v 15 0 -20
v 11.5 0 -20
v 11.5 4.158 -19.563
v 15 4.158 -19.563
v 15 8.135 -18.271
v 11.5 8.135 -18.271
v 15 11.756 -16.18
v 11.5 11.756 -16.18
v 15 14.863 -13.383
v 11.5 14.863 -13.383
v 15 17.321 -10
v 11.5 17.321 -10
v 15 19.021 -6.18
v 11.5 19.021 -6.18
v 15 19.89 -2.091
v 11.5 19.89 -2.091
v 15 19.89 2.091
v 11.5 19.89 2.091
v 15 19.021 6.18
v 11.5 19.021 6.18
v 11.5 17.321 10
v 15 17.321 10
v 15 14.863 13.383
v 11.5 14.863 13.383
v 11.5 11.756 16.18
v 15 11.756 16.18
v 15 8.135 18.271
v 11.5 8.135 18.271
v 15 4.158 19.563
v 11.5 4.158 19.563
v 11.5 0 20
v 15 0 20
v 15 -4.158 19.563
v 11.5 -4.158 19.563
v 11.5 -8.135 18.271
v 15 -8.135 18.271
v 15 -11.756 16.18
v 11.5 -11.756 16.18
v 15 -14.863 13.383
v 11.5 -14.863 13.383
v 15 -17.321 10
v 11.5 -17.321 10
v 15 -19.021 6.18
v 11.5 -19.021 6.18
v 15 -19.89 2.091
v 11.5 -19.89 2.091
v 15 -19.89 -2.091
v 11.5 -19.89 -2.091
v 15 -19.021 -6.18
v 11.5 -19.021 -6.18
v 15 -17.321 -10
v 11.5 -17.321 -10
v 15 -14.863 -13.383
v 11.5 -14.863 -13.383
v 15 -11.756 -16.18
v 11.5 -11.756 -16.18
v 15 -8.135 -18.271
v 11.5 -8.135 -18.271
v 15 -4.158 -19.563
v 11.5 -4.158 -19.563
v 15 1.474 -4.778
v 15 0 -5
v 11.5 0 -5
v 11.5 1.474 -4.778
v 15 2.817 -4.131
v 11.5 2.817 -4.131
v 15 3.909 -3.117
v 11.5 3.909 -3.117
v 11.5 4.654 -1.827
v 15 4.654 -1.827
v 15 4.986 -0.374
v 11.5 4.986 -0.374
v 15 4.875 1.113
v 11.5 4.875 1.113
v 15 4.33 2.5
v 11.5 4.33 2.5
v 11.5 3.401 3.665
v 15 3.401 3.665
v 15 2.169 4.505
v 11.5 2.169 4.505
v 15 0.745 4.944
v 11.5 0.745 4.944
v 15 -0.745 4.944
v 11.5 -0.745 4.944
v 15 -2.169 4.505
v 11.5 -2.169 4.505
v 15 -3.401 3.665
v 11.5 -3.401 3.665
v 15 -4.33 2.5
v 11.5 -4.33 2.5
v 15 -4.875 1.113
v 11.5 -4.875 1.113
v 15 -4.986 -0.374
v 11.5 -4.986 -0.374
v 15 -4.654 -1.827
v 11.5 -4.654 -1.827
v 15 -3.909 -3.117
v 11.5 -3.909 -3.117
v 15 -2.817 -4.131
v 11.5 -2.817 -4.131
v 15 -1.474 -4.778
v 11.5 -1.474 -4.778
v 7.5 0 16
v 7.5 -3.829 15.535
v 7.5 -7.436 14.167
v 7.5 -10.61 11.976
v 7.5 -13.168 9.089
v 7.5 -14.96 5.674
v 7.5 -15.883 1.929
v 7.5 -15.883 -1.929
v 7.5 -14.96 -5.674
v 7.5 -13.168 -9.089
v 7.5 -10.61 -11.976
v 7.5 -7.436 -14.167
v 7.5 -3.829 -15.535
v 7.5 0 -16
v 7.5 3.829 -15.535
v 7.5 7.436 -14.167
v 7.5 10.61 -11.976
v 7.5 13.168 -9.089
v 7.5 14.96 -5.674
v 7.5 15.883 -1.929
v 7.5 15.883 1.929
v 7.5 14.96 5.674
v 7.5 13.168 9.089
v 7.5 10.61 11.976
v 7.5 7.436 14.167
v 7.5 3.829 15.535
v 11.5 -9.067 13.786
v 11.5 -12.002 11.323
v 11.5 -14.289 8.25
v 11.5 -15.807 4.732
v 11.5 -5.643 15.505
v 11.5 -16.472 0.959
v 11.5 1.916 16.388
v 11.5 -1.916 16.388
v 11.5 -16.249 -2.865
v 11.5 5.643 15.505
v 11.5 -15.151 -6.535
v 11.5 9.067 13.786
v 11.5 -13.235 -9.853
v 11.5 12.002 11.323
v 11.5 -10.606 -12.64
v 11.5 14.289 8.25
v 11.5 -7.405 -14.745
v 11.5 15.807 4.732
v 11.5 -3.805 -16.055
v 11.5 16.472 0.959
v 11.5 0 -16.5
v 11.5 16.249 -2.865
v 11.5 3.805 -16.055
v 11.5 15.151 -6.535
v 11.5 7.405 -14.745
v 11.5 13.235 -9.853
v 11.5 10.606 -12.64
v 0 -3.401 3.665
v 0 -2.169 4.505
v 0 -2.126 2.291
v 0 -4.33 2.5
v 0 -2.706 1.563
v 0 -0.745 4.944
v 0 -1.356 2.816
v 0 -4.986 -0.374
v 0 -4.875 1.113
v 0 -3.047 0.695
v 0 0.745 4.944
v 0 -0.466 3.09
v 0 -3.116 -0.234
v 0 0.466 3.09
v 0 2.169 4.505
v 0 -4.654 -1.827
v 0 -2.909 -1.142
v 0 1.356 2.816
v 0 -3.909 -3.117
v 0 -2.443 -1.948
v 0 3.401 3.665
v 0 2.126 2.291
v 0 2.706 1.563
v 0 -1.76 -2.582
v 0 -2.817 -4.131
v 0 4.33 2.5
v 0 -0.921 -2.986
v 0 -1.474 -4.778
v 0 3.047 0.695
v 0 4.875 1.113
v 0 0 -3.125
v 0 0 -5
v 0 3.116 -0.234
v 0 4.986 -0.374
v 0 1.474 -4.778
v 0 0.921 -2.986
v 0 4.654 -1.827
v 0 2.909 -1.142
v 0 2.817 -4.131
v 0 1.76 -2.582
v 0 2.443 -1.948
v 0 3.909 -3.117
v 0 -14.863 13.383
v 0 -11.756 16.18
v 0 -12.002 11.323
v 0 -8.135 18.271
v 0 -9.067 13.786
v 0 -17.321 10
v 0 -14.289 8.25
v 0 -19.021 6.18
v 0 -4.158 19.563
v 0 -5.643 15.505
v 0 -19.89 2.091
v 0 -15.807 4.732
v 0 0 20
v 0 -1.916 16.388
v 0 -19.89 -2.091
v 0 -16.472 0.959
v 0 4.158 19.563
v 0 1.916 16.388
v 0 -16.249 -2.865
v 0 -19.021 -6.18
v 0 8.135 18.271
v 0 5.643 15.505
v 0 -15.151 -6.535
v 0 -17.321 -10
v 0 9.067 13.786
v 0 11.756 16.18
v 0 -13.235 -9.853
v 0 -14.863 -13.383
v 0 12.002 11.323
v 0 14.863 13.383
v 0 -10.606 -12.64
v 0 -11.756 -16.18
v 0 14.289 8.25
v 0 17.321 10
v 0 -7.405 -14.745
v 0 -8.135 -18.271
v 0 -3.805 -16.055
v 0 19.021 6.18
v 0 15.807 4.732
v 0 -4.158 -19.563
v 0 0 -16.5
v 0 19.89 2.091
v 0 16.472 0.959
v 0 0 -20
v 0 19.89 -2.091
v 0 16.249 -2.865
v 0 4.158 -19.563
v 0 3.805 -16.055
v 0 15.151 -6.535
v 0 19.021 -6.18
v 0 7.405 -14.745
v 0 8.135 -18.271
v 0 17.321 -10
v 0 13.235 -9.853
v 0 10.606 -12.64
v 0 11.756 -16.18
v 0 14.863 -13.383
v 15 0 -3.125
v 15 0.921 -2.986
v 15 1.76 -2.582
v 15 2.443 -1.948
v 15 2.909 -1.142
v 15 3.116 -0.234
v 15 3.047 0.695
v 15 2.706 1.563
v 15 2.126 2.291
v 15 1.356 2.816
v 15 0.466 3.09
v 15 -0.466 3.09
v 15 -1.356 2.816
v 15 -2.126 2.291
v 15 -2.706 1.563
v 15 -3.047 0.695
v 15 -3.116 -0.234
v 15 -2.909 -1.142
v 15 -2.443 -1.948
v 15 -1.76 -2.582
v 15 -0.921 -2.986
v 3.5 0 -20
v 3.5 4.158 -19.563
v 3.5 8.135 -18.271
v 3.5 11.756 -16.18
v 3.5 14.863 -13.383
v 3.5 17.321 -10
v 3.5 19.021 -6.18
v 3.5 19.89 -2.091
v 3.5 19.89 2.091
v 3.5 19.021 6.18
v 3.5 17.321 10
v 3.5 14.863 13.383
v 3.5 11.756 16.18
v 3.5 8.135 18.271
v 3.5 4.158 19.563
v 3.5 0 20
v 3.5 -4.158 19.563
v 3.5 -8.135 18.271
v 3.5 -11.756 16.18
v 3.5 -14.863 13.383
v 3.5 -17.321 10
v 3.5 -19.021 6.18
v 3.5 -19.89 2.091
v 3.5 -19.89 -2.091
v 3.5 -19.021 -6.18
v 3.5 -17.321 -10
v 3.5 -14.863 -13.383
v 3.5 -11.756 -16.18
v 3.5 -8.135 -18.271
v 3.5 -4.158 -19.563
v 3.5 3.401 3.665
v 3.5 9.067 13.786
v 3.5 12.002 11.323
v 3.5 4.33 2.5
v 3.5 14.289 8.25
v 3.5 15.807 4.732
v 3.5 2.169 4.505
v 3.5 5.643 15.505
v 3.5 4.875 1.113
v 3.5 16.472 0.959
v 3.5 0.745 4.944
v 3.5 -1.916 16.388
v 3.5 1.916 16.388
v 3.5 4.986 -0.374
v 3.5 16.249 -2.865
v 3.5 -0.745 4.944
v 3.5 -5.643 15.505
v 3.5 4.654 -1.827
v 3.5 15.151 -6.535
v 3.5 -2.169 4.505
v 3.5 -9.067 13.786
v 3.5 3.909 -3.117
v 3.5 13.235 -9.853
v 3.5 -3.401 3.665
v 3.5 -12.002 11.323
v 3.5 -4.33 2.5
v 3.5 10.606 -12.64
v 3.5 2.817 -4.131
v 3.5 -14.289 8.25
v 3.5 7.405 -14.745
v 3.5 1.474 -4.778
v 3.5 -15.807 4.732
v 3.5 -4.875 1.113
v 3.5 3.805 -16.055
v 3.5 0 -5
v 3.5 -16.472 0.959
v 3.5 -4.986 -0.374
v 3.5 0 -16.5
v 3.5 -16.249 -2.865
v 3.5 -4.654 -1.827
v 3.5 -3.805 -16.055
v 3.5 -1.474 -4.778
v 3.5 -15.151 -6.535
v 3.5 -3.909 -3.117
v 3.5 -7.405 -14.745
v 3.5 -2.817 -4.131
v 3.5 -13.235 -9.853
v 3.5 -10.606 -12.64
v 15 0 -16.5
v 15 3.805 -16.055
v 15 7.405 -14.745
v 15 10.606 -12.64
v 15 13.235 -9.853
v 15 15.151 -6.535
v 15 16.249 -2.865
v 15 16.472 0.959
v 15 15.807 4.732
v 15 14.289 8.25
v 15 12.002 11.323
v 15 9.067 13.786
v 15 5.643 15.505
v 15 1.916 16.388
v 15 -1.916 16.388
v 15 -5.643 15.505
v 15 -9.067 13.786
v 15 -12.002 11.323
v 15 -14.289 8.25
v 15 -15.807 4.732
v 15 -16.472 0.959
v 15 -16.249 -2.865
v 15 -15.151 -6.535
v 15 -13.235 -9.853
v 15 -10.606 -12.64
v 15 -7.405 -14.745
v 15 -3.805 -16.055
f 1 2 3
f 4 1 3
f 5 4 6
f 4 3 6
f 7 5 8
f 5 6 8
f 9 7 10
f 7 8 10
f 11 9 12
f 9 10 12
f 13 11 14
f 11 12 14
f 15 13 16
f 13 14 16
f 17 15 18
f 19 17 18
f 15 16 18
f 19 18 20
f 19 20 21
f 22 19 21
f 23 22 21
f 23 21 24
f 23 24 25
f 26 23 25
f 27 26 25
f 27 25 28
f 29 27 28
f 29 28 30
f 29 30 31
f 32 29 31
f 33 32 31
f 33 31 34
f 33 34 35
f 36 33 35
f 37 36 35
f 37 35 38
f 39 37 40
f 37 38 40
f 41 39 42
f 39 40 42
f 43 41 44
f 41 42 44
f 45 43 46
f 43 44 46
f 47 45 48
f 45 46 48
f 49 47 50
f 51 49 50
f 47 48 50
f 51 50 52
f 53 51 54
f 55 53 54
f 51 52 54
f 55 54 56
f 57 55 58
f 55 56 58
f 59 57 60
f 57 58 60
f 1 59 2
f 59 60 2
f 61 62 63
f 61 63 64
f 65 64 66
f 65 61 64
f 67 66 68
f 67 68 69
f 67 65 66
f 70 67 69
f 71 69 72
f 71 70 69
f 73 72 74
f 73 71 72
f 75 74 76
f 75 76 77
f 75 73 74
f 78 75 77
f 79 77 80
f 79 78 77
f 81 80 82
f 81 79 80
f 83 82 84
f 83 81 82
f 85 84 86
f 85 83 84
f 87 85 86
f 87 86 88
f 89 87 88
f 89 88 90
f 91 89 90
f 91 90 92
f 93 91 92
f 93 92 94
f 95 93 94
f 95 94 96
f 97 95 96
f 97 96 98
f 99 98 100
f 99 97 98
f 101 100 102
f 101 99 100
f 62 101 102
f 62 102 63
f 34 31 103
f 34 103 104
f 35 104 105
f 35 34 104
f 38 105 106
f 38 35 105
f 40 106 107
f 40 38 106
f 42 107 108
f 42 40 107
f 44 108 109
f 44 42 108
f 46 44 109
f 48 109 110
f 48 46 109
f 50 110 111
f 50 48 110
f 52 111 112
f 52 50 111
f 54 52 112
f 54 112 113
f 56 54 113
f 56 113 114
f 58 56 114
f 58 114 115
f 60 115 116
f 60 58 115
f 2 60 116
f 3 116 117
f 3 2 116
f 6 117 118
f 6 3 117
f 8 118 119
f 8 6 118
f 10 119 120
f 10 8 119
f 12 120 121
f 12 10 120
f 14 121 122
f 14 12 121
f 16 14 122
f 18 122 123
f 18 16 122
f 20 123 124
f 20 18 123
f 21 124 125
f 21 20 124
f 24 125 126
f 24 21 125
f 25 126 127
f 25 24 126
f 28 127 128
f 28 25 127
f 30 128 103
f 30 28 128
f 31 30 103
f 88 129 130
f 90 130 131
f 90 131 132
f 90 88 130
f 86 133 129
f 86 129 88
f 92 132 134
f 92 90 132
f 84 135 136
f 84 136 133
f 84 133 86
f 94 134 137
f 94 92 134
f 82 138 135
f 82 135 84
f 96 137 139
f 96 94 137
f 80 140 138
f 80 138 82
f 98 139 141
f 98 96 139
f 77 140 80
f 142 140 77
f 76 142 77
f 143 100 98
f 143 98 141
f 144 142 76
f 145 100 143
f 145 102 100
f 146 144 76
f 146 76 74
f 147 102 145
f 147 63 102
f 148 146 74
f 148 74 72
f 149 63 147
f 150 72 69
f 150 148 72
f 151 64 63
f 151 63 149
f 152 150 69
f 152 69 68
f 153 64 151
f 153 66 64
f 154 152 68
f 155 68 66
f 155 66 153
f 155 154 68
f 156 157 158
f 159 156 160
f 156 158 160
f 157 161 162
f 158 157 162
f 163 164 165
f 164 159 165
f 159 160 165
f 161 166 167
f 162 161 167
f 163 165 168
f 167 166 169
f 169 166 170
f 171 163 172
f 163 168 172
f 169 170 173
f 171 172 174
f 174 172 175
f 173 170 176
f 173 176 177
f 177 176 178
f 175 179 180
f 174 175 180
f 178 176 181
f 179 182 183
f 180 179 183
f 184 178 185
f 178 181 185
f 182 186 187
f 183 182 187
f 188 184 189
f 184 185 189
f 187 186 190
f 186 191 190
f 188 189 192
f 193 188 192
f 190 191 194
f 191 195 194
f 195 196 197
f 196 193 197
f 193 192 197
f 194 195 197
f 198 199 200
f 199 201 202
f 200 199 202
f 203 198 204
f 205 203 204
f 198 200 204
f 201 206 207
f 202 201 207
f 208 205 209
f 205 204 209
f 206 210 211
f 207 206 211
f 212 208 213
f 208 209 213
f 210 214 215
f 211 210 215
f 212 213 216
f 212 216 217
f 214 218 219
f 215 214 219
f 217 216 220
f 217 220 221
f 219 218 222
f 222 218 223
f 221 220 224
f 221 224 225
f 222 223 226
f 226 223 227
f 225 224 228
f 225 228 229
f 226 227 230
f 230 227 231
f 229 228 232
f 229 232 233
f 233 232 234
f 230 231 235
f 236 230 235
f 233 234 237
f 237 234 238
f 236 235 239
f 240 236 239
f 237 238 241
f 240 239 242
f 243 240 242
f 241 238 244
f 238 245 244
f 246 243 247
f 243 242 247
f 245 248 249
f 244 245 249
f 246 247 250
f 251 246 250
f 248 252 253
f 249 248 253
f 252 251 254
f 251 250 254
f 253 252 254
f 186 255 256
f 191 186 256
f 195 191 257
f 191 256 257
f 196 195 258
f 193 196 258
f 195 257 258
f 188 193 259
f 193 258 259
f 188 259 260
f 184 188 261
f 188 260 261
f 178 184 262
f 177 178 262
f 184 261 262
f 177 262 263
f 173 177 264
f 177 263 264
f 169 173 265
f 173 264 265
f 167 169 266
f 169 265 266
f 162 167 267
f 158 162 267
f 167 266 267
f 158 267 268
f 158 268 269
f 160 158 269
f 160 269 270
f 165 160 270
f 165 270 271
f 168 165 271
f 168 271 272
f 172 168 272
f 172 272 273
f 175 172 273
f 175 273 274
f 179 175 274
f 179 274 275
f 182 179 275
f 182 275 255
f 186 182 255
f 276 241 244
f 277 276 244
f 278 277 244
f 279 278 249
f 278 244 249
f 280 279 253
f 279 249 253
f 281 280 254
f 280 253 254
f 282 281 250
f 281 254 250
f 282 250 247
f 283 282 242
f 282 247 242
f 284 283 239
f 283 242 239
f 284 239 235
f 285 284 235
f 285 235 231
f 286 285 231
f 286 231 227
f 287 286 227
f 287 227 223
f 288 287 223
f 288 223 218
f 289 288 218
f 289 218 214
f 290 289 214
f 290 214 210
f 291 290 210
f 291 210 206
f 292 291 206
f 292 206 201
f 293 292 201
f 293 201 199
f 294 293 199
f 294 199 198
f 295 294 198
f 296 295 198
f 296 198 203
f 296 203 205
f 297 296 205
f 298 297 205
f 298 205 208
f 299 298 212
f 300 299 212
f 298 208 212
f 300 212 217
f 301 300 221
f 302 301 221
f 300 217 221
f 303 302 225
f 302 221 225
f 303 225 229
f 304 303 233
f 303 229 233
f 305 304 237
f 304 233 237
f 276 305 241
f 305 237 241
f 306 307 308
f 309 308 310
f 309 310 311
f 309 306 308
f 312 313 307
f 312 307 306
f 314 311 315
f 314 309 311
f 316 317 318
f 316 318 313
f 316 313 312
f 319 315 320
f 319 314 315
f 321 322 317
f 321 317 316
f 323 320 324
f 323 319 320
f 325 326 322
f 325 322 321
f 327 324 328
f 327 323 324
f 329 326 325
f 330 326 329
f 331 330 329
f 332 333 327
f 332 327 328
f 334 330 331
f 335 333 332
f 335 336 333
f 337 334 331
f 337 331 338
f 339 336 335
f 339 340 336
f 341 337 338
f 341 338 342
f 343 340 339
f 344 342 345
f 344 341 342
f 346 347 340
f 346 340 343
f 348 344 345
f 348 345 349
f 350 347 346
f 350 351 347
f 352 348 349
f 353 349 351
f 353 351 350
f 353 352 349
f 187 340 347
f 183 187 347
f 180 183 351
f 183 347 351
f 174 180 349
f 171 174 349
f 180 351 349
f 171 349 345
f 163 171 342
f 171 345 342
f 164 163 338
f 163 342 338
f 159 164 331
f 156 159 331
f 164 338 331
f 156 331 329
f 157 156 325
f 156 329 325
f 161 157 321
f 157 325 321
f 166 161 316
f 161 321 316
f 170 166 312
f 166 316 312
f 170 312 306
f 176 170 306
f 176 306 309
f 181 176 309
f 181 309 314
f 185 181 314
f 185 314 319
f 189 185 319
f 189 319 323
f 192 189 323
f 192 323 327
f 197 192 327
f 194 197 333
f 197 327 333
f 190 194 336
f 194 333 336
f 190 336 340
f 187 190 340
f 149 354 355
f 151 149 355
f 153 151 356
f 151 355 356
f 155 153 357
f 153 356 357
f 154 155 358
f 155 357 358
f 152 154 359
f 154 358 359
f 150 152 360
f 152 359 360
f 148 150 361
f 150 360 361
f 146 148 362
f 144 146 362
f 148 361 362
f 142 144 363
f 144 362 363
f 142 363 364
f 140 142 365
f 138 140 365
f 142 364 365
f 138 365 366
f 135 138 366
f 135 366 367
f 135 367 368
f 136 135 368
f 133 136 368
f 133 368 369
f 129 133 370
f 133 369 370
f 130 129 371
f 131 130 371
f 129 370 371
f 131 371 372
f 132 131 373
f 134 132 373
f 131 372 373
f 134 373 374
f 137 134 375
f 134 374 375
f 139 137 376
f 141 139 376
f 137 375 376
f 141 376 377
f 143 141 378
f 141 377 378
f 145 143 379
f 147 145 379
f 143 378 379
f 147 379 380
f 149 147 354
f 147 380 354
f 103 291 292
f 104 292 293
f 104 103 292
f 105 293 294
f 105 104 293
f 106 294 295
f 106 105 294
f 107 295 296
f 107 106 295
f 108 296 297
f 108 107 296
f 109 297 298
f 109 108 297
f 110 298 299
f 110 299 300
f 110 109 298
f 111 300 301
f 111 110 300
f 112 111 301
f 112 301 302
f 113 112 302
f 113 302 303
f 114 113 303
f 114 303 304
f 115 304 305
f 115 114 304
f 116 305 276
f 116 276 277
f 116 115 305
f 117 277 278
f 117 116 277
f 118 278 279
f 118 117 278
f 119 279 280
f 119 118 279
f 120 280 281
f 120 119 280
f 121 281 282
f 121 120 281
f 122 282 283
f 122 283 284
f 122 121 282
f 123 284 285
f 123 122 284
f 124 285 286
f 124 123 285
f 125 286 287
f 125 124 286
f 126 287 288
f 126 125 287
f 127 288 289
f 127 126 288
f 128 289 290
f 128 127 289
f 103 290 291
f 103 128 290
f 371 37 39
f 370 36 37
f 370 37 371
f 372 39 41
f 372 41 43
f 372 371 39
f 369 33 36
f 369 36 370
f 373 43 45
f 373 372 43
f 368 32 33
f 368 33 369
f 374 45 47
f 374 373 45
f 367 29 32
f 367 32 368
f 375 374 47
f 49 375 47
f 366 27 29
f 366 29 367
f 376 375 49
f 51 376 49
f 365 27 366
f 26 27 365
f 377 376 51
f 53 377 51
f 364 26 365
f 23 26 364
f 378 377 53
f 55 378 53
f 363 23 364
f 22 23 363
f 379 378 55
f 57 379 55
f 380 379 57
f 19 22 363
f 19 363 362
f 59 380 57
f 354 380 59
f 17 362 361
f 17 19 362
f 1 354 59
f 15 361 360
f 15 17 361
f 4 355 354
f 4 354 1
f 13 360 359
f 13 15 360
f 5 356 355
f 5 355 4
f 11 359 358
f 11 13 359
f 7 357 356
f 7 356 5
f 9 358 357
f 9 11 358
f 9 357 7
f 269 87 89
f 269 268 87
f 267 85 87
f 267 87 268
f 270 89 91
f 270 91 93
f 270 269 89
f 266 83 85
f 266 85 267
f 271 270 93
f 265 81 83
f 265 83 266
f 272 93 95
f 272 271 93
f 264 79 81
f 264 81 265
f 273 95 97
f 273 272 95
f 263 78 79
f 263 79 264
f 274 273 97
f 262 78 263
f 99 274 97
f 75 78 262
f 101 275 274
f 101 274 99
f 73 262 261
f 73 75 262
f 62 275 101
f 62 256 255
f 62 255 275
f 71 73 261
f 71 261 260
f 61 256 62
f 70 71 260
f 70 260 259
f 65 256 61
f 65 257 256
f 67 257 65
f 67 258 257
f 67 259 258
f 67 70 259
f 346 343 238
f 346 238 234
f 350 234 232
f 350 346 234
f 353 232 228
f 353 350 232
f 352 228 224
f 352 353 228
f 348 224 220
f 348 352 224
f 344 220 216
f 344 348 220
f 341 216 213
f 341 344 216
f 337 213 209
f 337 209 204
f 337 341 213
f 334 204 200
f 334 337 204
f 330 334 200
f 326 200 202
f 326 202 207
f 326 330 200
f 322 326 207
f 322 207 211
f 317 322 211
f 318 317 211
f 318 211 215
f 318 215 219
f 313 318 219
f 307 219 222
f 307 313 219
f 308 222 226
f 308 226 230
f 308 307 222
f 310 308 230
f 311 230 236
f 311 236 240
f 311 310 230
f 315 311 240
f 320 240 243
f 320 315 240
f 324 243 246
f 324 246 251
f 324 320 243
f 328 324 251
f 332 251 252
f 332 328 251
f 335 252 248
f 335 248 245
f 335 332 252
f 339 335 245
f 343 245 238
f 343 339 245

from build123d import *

# Parameters (mm, degrees)
SKETCH2_R           = 20
BOSS_EXTRUDE1_DEPTH = 15
SKETCH3_R           = 16.5
SKETCH3_R_2         = 5
CUT_EXTRUDE1_DEPTH  = 3.5
CUT_EXTRUDE2_START  = -3.5
SKETCH4_R           = 16.5
SKETCH4_R_2         = 5
CUT_EXTRUDE2_DEPTH  = 3.5
SKETCH6_R           = 3.125
CUT_EXTRUDE3_DEPTH  = 33.015621187


with BuildPart() as part:
    # Sketch2 → Boss-Extrude1 (new body)
    with BuildSketch(Plane(origin=(0, 0, 0), x_dir=(0, 0, -1), z_dir=(1, 0, 0))):
        Circle(SKETCH2_R)
    extrude(amount=BOSS_EXTRUDE1_DEPTH)

    # Sketch3 → Cut-Extrude1 (cut)
    with BuildSketch(Plane(origin=(15, 0, 0), x_dir=(0, 0, -1), z_dir=(1, 0, 0))):
        Circle(SKETCH3_R)
        Circle(SKETCH3_R_2, mode=Mode.SUBTRACT)
    extrude(amount=-CUT_EXTRUDE1_DEPTH, mode=Mode.SUBTRACT)

    # Sketch4 → Cut-Extrude2 (cut)
    with BuildSketch(Plane.ZY.offset(CUT_EXTRUDE2_START)):
        with Locations(Location((0, 0, 0), (0, 0, 180))):
            Circle(SKETCH4_R)
        with Locations(Location((0, 0, 0), (0, 0, 180))):
            Circle(SKETCH4_R_2, mode=Mode.SUBTRACT)
    extrude(amount=CUT_EXTRUDE2_DEPTH, mode=Mode.SUBTRACT)

    # Sketch6 → Cut-Extrude3 (cut, through all)
    with BuildSketch(Plane(origin=(15, 0, 0), x_dir=(0, 0, -1), z_dir=(1, 0, 0))):
        Circle(SKETCH6_R)
    extrude(amount=-CUT_EXTRUDE3_DEPTH, mode=Mode.SUBTRACT)

    # Sketch7 → Cut-Revolve3 (revolve, cut)
    with BuildSketch(Plane(origin=(0, 0, 0), x_dir=(1, 0, 0), z_dir=(0, 1, 0)), mode=Mode.PRIVATE) as cut_revolve3_sk:
        Polygon((3.5, 20), (7.5, 16), (11.5, 20), align=None)
    revolve(cut_revolve3_sk.sketch.rotate(Axis((0, 0, 0), (1, 0, 0)), 180), axis=Axis((0, 0, 0), (1, 0, 0)), mode=Mode.SUBTRACT)


solid = part.part
